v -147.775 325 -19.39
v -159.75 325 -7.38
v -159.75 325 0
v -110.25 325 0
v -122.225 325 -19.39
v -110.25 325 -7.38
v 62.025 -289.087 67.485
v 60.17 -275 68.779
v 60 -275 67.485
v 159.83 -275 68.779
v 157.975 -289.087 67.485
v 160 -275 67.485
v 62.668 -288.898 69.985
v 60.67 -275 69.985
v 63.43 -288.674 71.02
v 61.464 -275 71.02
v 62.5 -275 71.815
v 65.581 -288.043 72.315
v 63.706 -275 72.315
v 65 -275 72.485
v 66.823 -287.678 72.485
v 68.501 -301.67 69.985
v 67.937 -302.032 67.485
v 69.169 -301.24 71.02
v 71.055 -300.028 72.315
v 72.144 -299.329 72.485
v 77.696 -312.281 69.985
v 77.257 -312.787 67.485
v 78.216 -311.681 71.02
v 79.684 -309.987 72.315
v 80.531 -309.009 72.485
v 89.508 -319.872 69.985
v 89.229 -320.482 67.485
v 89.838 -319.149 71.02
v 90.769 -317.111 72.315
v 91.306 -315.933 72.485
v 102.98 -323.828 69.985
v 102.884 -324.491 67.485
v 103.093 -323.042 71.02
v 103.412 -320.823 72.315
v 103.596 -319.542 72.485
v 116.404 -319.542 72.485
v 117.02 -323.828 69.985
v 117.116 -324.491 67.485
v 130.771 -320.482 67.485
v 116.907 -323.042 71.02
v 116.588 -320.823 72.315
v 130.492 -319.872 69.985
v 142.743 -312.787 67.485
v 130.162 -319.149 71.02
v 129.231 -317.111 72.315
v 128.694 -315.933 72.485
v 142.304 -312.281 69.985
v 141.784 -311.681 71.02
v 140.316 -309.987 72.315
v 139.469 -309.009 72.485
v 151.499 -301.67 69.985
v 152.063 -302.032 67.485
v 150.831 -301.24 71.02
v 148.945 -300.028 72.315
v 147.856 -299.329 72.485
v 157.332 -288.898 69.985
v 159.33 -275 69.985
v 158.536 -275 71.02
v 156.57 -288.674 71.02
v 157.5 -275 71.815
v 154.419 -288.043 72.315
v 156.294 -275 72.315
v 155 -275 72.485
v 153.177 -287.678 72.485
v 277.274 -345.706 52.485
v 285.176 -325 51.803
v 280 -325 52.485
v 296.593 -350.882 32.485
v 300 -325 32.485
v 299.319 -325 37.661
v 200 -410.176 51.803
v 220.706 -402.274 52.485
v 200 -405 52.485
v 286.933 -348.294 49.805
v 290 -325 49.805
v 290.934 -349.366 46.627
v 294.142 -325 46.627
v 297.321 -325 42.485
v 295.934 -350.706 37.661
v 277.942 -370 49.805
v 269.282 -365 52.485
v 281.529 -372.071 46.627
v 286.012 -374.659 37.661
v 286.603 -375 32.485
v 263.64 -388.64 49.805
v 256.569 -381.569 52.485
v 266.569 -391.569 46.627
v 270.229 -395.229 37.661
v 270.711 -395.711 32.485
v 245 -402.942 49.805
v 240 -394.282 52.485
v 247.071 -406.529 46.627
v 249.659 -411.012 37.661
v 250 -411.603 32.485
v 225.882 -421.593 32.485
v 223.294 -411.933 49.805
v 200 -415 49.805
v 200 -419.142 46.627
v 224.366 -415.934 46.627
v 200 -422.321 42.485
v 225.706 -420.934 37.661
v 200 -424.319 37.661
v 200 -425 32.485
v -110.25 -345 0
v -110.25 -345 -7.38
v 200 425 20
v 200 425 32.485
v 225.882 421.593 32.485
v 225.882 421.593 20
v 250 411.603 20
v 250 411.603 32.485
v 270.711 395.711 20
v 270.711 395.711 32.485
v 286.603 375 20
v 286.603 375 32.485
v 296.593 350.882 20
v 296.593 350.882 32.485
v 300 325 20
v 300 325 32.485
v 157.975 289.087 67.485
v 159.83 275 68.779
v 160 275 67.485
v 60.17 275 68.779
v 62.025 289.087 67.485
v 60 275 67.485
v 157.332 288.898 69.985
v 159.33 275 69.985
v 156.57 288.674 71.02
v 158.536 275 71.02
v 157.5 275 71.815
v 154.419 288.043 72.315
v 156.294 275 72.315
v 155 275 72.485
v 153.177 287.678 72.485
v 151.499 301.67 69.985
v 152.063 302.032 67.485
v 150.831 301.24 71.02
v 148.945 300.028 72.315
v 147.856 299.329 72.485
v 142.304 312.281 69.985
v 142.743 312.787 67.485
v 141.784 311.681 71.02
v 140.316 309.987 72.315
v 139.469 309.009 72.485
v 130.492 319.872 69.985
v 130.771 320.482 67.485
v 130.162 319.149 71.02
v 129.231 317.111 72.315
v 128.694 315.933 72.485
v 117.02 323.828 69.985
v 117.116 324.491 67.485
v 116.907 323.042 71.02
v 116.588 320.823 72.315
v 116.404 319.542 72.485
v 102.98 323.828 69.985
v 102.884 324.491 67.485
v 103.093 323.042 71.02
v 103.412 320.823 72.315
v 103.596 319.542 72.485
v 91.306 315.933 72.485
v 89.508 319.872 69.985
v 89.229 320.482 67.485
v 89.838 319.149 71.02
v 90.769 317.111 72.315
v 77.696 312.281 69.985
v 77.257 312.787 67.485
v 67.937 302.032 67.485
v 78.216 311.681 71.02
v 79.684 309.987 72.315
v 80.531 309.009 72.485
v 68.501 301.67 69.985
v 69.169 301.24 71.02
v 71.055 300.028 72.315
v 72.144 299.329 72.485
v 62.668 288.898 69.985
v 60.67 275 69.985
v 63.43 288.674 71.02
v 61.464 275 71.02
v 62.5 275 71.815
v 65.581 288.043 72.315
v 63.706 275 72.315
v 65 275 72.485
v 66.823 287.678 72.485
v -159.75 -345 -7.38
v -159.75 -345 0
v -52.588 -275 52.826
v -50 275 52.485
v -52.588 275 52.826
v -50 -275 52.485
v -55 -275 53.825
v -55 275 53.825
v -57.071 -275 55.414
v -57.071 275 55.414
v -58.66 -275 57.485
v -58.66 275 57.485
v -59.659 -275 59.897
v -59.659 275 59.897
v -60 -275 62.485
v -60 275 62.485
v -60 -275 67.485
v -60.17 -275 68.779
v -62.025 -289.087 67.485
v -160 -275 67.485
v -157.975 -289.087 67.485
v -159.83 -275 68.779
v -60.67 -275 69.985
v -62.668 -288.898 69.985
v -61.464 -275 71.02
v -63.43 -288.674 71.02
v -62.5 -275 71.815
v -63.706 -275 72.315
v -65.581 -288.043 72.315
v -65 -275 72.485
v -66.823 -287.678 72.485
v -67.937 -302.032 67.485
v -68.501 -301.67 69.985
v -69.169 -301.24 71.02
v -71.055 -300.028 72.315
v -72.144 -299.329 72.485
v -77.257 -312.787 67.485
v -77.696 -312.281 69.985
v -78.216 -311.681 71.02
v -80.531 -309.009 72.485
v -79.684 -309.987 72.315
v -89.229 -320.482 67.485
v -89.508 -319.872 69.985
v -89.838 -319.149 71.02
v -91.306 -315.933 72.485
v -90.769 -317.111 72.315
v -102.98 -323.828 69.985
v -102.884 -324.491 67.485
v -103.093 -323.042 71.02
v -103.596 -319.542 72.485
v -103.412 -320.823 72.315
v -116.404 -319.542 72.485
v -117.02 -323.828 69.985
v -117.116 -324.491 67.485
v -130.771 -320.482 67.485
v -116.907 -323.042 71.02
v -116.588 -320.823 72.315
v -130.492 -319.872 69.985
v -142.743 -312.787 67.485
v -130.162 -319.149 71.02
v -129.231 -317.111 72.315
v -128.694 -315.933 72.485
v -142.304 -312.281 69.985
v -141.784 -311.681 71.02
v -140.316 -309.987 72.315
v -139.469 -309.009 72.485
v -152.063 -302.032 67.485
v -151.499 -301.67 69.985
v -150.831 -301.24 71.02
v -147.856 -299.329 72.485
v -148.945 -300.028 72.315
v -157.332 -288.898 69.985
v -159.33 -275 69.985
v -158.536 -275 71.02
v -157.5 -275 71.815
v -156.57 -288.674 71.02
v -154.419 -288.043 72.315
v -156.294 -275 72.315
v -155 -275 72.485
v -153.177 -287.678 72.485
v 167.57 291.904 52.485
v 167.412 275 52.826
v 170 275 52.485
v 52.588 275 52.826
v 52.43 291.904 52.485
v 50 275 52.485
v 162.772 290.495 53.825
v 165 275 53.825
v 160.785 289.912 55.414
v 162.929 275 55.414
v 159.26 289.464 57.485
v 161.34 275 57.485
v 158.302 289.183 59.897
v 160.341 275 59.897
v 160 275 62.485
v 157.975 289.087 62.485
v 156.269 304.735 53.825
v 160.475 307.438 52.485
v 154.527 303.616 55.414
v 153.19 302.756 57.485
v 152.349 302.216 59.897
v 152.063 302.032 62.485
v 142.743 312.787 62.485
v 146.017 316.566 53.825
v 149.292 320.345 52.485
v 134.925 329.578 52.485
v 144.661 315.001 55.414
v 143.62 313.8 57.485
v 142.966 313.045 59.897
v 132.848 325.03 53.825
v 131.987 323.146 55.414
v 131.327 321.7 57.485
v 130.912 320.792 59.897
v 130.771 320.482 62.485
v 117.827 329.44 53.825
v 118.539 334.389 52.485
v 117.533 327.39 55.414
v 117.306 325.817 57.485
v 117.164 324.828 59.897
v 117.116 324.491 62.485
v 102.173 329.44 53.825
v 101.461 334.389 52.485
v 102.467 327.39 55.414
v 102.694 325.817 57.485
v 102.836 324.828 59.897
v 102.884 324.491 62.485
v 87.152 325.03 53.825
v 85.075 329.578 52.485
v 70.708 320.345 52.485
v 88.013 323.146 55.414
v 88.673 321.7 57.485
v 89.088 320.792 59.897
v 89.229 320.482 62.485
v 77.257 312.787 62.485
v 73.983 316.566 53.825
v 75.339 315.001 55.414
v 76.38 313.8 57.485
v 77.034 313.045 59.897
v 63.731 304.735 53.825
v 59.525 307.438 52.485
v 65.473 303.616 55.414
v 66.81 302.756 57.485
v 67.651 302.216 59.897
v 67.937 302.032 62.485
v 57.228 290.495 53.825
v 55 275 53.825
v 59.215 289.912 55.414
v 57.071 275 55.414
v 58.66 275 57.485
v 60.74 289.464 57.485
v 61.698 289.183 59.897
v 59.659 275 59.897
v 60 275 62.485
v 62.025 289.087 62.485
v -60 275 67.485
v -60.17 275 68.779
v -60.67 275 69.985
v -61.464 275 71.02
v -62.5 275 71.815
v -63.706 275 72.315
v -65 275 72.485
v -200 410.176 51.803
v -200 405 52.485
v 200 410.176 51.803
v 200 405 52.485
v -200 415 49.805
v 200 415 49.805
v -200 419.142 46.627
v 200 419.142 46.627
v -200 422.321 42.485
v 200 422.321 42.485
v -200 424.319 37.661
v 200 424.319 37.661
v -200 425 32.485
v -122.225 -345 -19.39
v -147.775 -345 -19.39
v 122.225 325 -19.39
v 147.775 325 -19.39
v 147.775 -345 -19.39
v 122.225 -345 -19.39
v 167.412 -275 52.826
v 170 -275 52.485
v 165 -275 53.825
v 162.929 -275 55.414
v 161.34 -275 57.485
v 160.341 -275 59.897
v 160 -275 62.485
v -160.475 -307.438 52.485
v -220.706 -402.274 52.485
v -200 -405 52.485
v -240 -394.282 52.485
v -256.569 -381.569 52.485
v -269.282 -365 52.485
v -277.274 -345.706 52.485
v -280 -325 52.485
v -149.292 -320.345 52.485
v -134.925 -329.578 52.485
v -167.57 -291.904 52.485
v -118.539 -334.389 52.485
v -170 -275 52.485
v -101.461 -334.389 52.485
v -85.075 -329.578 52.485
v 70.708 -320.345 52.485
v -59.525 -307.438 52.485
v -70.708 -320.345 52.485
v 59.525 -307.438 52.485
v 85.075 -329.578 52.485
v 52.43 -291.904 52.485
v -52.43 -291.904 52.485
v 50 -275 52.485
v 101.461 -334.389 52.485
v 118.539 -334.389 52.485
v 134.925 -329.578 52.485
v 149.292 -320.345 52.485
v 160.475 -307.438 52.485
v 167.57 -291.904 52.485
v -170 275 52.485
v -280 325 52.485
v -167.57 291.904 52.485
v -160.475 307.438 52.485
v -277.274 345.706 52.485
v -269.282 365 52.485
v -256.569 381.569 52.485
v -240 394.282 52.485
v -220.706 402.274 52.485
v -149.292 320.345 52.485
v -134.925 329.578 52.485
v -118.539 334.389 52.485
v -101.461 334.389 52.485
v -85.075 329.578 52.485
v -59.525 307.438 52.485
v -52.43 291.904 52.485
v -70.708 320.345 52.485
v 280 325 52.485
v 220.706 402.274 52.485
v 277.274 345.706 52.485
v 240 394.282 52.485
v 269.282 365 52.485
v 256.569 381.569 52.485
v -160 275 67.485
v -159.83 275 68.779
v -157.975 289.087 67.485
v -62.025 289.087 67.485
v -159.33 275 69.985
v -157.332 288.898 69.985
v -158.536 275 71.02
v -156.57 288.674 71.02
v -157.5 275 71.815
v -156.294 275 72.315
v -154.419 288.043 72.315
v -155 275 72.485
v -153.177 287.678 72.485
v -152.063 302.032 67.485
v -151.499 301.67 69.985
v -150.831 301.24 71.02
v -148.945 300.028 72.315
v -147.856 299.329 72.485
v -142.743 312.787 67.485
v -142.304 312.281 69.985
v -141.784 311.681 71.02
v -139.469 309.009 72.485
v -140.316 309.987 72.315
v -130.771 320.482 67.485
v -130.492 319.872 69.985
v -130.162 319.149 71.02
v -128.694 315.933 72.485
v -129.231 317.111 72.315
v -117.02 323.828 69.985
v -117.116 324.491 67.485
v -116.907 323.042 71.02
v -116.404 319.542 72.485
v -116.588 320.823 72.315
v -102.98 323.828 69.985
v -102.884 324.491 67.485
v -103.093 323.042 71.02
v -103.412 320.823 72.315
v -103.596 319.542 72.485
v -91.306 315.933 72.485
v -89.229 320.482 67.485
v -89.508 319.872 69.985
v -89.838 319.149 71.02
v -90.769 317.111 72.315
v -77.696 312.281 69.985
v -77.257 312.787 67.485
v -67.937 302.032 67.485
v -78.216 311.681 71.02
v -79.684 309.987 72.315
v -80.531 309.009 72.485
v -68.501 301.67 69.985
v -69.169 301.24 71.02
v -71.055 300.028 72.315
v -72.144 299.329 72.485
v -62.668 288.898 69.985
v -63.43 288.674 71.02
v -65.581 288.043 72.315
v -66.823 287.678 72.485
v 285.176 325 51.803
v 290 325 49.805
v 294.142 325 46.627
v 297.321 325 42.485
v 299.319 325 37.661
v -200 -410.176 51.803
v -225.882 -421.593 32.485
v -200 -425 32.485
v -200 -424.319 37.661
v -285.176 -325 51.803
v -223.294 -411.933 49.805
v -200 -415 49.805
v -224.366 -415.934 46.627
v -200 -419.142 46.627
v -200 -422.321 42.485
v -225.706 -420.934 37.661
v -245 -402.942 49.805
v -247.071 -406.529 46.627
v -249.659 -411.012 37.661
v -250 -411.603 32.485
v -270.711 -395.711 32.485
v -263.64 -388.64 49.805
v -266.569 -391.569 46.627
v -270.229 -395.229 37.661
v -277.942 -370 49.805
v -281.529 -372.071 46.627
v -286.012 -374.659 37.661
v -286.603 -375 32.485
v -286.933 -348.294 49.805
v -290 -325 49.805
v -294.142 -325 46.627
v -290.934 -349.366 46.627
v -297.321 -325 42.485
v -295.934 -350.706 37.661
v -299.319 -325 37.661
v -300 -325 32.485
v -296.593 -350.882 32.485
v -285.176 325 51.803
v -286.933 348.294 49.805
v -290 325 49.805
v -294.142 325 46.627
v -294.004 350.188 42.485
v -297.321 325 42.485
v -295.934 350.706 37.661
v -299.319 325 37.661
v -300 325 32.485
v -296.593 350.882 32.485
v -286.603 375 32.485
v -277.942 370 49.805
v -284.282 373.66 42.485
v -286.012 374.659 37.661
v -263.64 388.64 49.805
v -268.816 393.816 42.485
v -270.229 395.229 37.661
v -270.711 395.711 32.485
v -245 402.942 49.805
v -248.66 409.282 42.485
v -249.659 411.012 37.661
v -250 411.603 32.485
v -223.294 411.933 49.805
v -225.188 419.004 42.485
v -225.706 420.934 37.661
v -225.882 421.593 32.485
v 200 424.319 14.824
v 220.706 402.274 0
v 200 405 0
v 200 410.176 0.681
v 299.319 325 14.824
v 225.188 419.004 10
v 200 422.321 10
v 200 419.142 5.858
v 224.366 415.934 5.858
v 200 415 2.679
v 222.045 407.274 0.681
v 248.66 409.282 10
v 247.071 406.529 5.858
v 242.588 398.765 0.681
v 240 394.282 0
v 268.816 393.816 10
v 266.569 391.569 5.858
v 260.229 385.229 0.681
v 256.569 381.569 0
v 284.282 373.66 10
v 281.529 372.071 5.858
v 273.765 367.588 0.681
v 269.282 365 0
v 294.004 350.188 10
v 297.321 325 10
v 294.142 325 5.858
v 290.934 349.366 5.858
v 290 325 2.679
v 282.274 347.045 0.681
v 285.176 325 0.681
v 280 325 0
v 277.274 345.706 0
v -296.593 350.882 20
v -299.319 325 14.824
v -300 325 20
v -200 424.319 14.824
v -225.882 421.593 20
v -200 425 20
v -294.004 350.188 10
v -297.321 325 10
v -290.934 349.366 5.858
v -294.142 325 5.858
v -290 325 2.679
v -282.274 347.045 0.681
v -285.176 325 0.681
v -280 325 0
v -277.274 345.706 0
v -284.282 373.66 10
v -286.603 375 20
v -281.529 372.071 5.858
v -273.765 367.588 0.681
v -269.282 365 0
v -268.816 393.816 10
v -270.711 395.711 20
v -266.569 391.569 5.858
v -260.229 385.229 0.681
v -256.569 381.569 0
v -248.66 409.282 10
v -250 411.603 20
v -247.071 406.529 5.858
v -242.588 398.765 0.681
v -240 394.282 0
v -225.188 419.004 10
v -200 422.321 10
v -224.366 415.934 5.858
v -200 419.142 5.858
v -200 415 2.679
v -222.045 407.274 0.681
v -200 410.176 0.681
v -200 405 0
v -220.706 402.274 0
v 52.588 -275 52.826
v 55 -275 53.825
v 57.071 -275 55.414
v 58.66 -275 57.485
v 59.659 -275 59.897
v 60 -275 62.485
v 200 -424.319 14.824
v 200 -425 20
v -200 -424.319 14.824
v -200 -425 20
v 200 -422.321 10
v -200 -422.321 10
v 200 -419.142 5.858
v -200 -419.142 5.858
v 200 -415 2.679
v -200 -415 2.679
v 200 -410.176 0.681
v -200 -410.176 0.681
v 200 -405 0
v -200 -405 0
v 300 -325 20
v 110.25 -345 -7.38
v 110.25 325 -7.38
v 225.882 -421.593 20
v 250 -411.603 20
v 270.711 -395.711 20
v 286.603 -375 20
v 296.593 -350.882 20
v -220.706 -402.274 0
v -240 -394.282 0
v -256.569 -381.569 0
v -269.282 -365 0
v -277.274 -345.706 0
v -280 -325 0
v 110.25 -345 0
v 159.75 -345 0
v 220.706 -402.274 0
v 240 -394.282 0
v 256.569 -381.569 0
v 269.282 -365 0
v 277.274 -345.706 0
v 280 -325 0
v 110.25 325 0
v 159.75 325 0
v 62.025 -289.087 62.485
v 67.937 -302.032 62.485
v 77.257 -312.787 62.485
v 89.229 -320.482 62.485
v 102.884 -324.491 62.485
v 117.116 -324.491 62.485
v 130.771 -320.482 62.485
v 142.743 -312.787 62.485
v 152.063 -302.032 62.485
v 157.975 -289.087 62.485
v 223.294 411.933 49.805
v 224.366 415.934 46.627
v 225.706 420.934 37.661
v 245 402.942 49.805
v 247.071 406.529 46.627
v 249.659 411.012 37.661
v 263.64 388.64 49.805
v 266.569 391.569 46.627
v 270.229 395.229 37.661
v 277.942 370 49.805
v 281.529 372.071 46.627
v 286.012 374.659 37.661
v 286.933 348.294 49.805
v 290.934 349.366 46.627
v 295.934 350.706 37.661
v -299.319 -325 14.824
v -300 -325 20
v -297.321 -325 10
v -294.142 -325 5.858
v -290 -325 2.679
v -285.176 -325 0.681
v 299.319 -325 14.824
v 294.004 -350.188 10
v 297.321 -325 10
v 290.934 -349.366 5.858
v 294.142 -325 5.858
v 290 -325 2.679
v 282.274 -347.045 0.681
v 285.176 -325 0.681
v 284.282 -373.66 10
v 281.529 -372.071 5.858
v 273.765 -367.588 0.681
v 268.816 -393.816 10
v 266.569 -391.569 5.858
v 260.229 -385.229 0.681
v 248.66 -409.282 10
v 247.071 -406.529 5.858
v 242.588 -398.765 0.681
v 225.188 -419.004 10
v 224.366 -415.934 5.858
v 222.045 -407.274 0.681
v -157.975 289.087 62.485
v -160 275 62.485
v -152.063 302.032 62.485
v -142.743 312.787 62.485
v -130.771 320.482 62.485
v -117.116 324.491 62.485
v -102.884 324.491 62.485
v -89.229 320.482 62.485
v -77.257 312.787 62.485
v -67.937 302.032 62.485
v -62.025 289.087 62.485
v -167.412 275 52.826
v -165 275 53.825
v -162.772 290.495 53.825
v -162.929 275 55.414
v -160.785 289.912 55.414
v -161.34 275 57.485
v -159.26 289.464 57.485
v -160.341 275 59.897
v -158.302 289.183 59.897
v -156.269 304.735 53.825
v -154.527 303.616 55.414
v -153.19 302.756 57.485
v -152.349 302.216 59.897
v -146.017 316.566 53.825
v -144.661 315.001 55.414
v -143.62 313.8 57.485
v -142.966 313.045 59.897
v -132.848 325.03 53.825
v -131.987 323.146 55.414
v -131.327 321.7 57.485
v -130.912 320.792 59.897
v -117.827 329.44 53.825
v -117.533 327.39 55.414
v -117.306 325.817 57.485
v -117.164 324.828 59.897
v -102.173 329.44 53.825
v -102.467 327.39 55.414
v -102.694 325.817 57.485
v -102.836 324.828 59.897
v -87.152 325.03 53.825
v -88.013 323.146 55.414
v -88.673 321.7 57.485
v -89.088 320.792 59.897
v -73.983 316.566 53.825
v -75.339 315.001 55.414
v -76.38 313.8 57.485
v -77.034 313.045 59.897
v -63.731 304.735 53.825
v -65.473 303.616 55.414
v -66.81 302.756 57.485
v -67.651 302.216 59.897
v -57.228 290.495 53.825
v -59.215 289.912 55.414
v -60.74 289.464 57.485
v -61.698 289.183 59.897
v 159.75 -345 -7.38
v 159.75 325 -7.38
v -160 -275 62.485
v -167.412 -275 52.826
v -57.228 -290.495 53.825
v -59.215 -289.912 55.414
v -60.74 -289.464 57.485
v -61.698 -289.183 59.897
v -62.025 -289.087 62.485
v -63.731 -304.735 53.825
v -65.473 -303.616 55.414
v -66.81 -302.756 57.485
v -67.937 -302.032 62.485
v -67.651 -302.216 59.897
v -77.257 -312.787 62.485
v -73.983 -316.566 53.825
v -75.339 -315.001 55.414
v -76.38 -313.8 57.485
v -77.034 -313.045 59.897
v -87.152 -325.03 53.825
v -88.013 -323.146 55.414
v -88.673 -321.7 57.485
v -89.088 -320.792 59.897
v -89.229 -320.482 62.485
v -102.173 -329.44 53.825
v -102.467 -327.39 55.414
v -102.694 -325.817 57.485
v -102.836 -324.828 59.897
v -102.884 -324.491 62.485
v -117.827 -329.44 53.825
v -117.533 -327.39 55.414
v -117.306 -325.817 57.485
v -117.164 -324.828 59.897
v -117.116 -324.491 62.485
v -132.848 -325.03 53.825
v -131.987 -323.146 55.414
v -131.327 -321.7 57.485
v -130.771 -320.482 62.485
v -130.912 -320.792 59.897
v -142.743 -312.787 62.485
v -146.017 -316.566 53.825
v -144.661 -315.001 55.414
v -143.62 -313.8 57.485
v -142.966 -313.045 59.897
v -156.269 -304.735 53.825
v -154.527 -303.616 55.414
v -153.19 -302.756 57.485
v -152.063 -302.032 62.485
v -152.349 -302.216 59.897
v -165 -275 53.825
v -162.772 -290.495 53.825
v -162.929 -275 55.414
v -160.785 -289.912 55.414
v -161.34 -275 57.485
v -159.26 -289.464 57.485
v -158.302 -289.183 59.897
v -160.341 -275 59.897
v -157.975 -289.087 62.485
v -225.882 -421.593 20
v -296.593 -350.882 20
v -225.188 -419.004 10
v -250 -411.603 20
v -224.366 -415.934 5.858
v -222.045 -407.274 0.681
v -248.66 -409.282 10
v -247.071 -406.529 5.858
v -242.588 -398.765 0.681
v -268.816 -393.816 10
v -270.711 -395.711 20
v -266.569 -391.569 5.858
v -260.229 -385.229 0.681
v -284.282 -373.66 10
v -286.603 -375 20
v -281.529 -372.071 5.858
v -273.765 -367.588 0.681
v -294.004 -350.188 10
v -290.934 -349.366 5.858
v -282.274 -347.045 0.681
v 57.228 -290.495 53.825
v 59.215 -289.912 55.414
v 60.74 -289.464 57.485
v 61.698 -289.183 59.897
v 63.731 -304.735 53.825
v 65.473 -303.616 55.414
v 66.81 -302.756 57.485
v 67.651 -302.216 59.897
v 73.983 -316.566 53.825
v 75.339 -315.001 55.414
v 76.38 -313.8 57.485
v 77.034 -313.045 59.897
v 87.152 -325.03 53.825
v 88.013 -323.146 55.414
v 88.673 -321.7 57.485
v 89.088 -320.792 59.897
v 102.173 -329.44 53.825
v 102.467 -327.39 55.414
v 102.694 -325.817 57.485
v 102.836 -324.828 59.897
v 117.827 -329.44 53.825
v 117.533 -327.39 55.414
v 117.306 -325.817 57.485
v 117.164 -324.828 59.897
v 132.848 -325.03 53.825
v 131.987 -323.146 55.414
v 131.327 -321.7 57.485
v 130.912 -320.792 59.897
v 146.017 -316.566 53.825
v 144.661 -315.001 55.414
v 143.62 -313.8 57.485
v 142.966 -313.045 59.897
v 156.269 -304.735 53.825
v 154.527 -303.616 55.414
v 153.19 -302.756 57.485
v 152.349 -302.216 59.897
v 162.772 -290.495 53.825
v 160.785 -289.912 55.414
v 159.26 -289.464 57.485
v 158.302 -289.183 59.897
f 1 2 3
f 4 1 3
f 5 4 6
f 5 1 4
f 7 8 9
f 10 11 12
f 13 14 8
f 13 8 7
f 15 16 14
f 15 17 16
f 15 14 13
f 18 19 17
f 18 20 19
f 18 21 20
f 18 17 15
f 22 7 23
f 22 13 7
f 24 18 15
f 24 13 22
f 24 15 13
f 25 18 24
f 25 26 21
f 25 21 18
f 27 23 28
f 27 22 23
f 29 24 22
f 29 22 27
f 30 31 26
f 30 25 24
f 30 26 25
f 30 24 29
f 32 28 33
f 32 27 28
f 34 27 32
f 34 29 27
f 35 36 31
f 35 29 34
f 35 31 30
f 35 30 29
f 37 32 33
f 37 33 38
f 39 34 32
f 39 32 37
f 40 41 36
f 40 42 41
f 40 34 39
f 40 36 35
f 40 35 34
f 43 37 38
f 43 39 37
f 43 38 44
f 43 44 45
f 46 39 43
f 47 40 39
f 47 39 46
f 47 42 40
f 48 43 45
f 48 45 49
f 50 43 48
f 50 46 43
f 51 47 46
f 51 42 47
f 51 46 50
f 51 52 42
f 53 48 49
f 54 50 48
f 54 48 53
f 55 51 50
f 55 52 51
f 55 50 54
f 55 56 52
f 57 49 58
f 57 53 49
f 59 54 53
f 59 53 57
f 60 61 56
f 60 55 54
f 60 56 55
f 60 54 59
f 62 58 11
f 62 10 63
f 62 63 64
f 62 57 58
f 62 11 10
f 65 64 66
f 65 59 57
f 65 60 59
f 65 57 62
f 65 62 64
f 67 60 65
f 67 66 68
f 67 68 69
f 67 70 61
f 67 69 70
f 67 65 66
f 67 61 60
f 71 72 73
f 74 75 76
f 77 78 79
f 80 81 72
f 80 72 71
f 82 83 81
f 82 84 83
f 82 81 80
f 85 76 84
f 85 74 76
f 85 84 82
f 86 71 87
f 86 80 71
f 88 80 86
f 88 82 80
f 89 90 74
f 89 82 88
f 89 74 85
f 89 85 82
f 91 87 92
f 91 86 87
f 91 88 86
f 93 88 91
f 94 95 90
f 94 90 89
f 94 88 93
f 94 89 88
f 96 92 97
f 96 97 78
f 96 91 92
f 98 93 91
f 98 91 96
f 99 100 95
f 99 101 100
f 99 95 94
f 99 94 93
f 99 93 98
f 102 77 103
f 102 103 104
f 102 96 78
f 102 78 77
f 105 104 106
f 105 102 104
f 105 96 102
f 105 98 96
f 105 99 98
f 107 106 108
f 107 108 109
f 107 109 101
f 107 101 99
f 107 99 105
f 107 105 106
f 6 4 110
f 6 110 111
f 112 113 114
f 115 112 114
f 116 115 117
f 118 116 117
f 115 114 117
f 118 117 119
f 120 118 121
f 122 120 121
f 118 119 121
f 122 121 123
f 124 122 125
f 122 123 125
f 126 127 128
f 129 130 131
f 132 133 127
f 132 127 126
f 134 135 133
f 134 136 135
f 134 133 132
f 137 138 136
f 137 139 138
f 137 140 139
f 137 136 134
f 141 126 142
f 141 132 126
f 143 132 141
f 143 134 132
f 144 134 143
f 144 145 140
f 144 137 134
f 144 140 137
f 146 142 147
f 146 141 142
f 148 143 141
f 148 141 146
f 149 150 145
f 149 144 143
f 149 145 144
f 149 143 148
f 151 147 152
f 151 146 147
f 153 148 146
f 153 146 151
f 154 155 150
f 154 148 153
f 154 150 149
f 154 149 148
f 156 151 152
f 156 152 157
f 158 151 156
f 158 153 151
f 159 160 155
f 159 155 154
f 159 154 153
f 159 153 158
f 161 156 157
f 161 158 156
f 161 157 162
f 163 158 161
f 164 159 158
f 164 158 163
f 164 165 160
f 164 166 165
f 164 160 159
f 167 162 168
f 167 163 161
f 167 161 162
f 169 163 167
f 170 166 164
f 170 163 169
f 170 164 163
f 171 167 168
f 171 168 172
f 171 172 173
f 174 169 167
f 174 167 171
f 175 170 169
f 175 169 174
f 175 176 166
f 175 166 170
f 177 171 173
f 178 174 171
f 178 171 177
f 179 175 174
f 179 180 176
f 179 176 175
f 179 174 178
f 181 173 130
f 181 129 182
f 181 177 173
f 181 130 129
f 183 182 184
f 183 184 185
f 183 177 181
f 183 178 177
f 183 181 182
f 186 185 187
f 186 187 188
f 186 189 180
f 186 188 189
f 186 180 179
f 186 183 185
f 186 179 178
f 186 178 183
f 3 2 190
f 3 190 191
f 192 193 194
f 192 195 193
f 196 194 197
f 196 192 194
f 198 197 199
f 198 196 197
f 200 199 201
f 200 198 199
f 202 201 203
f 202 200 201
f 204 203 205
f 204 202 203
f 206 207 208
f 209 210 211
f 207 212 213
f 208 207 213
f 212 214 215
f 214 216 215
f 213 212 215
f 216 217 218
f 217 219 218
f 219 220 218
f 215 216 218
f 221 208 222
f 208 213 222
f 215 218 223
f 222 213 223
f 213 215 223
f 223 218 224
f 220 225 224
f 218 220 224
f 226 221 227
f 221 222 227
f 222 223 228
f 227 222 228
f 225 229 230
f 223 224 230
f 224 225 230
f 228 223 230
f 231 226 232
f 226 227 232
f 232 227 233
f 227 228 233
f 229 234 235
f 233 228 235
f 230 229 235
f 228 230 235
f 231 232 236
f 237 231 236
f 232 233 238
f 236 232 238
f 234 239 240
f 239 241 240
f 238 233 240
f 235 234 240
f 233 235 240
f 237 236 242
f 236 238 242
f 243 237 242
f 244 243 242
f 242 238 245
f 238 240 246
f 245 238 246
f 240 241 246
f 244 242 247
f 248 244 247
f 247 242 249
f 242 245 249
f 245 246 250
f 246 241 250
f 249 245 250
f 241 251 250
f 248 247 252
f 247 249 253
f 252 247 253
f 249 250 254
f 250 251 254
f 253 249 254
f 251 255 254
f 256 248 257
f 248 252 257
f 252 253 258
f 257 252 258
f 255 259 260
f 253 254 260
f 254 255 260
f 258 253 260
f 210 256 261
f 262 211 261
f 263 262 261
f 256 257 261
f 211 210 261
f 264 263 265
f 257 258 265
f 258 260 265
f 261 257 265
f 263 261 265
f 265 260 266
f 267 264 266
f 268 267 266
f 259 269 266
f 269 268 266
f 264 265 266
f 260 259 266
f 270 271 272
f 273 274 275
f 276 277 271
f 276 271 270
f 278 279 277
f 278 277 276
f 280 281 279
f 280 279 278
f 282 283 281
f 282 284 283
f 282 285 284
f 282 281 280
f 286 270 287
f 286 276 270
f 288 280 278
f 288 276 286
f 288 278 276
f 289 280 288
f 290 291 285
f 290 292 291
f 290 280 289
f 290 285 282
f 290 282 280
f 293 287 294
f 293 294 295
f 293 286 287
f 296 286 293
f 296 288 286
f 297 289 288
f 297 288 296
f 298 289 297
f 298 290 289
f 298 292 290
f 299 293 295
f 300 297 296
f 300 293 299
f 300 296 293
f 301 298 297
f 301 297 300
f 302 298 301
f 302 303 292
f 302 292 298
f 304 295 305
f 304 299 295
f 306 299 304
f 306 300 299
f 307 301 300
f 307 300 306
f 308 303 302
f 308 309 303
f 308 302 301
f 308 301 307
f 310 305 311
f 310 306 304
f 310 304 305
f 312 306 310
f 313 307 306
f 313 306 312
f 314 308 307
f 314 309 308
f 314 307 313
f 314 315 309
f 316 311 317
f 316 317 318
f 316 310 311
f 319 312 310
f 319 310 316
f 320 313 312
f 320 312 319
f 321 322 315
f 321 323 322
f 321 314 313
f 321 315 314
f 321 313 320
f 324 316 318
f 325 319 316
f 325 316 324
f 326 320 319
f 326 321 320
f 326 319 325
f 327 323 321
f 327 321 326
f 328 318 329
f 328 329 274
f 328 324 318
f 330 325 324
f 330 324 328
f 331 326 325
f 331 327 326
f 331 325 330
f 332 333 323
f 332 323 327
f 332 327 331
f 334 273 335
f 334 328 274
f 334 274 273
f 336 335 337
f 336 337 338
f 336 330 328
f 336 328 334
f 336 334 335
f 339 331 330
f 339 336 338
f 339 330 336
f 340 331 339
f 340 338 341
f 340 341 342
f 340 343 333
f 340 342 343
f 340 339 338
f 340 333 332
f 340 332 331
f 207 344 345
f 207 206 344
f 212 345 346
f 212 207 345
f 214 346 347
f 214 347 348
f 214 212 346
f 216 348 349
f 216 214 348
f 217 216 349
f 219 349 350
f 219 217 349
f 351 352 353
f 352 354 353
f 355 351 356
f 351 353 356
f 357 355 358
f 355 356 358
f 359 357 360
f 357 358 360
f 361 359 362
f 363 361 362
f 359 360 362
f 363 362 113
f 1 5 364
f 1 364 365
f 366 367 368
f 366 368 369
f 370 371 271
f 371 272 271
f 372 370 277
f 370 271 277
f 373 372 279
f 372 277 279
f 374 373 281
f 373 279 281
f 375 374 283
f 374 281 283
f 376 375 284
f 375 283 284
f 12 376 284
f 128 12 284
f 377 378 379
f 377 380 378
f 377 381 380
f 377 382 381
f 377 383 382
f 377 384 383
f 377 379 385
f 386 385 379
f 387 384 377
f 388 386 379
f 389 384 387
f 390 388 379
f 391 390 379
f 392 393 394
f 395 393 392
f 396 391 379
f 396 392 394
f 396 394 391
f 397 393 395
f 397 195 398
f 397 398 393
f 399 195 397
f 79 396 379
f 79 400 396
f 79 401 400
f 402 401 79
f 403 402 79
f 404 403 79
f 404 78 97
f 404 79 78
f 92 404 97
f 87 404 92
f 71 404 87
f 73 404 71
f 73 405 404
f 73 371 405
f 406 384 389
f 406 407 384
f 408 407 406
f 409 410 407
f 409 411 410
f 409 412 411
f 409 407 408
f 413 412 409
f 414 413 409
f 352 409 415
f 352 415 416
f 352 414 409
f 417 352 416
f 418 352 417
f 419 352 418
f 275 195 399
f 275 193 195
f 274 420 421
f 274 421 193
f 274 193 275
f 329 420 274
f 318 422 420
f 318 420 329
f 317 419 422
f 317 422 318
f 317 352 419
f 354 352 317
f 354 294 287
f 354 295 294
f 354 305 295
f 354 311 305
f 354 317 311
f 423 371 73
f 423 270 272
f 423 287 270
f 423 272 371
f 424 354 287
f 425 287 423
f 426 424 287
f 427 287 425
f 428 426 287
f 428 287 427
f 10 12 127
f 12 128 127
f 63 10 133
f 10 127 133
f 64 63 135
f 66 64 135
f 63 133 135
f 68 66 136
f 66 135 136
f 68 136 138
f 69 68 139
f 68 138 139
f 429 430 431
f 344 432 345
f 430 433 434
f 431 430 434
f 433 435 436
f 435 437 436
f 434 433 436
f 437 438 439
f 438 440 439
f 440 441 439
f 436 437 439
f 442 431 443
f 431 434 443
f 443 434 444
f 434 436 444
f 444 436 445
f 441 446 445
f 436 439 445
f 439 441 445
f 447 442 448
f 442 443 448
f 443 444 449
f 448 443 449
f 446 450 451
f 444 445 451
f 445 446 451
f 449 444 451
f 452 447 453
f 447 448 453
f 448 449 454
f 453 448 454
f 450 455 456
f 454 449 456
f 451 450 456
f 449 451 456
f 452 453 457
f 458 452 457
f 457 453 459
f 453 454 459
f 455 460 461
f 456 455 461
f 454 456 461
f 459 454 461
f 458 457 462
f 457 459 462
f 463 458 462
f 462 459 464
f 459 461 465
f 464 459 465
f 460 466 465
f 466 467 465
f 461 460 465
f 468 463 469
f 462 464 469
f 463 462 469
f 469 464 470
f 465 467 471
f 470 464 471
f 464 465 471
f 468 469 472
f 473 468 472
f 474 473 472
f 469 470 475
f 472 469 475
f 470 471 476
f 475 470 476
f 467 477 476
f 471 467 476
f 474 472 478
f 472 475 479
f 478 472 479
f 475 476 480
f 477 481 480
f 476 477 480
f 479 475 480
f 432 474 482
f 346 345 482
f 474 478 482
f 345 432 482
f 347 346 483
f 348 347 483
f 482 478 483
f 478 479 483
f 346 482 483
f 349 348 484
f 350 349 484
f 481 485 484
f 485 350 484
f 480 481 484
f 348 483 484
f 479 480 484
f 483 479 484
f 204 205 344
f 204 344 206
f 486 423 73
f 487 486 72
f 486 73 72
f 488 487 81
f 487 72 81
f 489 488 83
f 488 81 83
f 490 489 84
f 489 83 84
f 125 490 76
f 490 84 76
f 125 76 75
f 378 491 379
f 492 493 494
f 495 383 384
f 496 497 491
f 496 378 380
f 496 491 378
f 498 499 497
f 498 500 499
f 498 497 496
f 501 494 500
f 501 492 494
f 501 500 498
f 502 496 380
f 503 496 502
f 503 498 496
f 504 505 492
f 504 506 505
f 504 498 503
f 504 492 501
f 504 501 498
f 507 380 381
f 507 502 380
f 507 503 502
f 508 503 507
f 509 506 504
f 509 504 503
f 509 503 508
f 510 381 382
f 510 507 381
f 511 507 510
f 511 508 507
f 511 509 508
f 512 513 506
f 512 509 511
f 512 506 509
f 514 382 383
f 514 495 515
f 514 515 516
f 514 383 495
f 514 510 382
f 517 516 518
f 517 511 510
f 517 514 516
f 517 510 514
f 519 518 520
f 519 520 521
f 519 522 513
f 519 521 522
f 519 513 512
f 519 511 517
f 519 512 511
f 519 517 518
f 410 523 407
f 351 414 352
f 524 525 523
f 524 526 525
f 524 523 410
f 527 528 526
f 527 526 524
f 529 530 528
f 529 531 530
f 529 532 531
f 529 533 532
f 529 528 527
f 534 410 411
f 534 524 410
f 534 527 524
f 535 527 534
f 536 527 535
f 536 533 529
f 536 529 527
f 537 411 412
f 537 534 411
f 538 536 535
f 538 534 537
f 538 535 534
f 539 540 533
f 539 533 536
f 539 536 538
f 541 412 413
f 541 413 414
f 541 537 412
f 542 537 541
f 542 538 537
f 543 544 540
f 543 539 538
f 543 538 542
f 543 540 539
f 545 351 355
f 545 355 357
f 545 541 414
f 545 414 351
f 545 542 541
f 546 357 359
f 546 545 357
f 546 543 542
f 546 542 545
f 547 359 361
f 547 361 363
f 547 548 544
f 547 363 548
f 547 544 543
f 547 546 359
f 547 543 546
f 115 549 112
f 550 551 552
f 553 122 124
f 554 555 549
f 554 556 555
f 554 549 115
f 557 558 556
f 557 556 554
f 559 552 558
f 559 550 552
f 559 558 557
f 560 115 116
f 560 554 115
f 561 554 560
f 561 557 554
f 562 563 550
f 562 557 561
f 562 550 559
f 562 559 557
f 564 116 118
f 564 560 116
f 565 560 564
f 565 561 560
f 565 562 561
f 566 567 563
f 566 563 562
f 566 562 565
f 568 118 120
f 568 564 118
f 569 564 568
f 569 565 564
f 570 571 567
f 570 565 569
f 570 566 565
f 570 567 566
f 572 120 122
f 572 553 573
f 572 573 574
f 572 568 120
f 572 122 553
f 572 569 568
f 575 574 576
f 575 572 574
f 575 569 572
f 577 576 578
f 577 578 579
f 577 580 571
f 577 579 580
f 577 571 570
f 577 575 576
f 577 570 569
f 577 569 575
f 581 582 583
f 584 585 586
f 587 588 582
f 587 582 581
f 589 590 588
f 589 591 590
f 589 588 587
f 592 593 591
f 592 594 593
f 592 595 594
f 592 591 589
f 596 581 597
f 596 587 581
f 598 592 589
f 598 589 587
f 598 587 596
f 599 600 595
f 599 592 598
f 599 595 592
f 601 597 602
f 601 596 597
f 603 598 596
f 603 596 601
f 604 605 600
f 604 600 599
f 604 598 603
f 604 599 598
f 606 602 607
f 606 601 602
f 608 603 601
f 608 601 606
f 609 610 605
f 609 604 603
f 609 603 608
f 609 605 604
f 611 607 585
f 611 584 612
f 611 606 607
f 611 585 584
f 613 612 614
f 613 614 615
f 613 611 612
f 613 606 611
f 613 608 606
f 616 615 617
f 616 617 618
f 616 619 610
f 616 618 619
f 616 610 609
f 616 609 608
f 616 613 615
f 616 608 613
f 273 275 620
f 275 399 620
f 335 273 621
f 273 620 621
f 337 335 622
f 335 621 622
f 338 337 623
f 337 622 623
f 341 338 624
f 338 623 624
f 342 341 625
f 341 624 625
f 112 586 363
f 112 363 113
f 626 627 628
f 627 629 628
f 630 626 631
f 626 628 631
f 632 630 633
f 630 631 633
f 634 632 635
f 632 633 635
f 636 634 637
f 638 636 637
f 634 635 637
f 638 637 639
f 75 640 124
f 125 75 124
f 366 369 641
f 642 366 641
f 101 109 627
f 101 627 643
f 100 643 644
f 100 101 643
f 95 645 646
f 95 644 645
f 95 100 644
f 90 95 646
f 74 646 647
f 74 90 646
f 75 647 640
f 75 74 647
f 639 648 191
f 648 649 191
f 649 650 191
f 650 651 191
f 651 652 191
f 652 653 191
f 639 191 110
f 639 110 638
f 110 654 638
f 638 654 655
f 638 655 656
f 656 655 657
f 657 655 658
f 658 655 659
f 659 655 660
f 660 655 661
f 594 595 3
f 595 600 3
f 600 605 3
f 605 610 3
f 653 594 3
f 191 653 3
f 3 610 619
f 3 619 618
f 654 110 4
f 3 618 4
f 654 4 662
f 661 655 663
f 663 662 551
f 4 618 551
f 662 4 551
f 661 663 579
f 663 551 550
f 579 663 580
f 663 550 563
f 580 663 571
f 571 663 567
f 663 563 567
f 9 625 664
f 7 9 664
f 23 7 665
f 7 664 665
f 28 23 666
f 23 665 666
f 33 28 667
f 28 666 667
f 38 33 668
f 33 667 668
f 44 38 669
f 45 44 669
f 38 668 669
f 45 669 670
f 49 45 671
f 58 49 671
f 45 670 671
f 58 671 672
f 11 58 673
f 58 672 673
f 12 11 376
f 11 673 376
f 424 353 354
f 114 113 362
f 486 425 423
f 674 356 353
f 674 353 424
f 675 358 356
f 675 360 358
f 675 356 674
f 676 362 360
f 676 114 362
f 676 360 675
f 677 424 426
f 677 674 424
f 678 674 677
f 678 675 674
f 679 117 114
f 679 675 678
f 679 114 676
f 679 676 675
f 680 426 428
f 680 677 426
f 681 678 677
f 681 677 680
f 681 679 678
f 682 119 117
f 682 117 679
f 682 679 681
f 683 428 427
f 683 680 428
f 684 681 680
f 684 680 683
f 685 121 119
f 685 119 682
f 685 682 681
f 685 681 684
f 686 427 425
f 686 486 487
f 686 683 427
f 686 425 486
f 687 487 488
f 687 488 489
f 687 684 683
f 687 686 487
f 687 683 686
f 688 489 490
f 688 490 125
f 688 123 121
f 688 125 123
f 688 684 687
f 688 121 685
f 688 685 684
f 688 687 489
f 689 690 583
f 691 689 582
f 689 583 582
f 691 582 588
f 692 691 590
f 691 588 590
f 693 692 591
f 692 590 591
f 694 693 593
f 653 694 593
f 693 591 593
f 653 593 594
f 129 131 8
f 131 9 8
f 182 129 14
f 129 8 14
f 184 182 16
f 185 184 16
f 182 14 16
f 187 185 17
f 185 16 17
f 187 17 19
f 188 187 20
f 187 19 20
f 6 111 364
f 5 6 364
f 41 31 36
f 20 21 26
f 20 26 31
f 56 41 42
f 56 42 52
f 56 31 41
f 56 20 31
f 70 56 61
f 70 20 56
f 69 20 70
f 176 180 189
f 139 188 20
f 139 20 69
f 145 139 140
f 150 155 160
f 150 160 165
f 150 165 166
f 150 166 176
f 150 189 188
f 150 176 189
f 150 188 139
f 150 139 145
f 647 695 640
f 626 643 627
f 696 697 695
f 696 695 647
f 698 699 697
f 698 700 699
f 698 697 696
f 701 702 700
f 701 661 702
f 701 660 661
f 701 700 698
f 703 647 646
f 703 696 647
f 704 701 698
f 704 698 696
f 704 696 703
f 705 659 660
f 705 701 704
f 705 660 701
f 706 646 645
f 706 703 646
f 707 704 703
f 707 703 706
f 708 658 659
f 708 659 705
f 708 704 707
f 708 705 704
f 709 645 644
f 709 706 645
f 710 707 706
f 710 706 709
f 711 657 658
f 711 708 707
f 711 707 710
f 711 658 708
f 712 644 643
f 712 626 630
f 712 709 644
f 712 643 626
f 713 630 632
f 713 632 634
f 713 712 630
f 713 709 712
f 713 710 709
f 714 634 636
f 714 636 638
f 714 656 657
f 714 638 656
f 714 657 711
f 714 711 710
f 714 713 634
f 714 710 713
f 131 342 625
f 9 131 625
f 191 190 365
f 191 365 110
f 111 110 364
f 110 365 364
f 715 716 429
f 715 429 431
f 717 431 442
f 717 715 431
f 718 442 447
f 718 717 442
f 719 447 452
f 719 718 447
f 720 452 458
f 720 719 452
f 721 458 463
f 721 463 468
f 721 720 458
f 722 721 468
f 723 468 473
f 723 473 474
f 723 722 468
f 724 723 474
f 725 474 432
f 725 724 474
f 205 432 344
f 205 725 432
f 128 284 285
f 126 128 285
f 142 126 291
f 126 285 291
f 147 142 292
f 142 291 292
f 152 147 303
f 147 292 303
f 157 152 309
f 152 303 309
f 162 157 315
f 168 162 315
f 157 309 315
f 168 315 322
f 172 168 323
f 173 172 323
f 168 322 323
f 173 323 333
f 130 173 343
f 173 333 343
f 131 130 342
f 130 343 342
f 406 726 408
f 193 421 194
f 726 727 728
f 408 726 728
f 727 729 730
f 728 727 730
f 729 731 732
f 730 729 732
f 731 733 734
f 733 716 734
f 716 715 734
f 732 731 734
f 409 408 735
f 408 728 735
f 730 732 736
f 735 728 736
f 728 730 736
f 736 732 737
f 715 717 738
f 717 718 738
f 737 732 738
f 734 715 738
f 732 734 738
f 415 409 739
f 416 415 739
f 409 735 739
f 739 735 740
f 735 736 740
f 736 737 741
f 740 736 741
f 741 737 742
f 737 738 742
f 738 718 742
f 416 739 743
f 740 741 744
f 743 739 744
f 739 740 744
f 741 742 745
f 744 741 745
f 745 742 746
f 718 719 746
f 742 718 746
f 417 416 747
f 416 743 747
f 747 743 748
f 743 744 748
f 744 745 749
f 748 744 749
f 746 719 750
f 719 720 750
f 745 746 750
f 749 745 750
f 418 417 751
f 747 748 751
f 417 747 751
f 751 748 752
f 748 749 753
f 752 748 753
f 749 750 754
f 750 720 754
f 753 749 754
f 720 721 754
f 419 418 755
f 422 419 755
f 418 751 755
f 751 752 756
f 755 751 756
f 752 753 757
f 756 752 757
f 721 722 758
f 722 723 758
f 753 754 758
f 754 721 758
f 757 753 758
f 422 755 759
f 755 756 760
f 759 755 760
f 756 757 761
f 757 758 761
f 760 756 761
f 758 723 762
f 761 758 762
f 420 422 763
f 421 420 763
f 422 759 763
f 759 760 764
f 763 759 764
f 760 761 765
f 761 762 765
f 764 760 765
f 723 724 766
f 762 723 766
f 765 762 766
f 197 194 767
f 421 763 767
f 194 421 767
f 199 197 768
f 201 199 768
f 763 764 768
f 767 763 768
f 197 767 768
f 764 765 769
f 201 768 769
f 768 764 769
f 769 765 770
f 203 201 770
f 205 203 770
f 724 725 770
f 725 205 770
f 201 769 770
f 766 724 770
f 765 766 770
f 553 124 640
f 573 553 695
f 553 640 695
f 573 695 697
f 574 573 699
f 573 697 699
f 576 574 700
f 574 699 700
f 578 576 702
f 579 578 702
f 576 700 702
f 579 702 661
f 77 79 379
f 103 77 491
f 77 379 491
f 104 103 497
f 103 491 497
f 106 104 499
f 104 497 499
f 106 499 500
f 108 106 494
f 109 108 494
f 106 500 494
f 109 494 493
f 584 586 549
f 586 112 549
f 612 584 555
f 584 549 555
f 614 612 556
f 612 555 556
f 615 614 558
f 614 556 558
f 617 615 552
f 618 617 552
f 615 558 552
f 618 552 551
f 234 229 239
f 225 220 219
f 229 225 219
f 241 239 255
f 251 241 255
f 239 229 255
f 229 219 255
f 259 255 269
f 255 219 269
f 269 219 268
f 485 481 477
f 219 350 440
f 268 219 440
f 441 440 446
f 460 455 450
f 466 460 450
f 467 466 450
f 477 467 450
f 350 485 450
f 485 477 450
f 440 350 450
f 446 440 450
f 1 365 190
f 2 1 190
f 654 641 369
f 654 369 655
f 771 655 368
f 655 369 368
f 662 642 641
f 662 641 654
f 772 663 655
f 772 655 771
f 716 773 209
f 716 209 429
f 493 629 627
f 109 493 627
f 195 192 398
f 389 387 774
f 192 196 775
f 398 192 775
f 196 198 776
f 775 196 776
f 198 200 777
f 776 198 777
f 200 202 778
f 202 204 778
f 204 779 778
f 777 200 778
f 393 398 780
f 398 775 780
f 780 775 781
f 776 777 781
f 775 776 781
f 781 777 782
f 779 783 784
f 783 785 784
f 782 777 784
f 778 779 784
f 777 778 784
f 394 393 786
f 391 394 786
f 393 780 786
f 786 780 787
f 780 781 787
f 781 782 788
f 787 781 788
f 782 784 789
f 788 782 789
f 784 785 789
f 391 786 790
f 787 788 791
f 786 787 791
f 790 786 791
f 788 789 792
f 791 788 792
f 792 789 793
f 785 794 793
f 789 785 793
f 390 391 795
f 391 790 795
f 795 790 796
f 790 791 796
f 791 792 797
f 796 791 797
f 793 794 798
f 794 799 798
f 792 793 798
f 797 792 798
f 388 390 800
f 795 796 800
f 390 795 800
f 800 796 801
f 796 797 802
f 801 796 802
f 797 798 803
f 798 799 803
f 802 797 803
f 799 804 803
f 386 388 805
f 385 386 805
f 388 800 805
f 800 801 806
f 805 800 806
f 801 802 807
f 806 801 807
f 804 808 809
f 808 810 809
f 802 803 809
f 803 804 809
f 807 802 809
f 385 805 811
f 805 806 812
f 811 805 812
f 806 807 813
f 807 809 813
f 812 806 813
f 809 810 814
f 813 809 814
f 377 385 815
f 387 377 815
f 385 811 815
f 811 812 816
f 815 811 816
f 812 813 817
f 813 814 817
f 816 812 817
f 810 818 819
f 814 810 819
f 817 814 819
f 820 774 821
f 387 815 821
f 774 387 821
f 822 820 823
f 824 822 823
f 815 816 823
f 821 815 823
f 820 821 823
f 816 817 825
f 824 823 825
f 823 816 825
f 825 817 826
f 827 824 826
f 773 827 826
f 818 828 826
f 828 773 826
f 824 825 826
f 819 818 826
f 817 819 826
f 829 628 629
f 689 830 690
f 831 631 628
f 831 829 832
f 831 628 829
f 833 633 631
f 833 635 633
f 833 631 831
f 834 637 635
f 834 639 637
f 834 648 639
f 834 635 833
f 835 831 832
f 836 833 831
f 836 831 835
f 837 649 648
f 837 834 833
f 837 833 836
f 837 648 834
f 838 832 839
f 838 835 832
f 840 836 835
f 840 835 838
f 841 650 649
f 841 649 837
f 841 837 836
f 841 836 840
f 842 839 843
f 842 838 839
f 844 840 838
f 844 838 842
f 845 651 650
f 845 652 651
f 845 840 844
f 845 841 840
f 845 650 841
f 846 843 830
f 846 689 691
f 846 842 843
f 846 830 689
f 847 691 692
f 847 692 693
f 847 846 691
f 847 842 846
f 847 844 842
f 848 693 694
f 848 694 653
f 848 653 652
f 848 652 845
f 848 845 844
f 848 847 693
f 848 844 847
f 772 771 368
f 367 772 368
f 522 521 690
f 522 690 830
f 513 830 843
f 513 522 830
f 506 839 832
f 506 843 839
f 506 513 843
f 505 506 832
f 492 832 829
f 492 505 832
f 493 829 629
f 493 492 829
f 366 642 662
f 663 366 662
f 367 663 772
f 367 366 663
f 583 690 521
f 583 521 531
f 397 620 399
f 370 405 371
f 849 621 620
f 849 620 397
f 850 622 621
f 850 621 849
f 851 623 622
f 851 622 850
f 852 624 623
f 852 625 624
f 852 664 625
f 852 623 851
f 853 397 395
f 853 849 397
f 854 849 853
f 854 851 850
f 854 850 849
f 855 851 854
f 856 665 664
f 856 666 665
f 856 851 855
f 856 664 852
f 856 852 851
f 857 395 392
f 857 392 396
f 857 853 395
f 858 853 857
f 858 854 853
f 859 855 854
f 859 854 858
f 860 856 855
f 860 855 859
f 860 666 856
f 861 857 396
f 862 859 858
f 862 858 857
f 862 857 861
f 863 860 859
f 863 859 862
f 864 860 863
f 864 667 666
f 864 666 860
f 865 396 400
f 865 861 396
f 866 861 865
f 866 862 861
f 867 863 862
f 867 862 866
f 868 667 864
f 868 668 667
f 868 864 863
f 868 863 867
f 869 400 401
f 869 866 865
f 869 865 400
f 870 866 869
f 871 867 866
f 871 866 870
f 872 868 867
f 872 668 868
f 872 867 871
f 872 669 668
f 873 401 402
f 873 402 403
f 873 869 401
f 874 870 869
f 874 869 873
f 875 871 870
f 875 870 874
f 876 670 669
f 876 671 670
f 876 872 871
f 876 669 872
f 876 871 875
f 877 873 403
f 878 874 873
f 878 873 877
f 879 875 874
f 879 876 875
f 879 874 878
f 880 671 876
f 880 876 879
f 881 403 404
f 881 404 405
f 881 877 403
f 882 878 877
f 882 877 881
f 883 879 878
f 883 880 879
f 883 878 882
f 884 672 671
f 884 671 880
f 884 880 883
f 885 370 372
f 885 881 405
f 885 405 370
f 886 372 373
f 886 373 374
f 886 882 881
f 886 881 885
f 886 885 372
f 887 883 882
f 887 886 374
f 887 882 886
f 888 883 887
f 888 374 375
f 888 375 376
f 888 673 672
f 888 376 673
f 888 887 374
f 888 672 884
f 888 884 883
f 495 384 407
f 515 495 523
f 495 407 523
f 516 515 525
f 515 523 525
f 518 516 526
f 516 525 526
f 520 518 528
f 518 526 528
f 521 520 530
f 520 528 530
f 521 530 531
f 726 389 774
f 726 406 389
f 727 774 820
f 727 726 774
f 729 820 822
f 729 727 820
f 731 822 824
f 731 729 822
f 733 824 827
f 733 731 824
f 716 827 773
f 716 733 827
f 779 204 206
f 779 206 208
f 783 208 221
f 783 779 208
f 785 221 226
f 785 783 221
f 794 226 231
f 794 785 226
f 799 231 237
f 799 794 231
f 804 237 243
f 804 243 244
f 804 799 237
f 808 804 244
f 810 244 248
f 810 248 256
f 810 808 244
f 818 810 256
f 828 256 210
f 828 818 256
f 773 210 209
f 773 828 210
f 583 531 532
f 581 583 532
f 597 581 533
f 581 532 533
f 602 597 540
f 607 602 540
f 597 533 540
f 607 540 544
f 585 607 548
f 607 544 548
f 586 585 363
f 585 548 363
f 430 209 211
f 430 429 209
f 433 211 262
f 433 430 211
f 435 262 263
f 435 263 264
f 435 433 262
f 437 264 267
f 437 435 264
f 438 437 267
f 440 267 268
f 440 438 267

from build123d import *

# Parameters (mm, degrees)
SKETCH_1_W      = 600
SKETCH_1_H      = 850
EXTRUDE_1_DEPTH = 52.484908593
EXTRUDE_2_DEPTH = 20
FILLET_1_R      = 100
FILLET_2_R      = 10
FILLET_3_R      = 5
FILLET_4_R      = 20
EXTRUDE_START   = -100
EXTRUDE_3_DEPTH = 670


with BuildPart() as part:
    # 草图1 → 凸台-拉伸1 (new body)
    with BuildSketch(Plane.XY):
        Rectangle(SKETCH_1_W, SKETCH_1_H)
    extrude(amount=EXTRUDE_1_DEPTH)

    # 草图2 → 凸台-拉伸2 (add)
    with BuildSketch(Plane.XY.offset(52.484908593)):
        with BuildLine():
            Line((-60, 275), (-60, -275))
            ThreePointArc((-60, -275), (-110, -325), (-160, -275))
            Line((-160, -275), (-160, 275))
            ThreePointArc((-160, 275), (-110, 325), (-60, 275))
        make_face()
        with BuildLine():
            Line((60, 275), (60, -275))
            ThreePointArc((60, -275), (110, -325), (160, -275))
            Line((160, -275), (160, 275))
            ThreePointArc((160, 275), (110, 325), (60, 275))
        make_face()
    extrude(amount=EXTRUDE_2_DEPTH)

    # 圆角1
    fillet_1_edges = [part.edges().sort_by_distance(p)[0] for p in [
        (300, -425, 26.242454296),
        (-300, -425, 26.242454296),
        (-300, 425, 26.242454296),
        (300, 425, 26.242454296),
    ]]
    fillet(fillet_1_edges, radius=FILLET_1_R)

    # 圆角2
    fillet_2_edges = [part.edges().sort_by_distance(p)[0] for p in [
        (-110, 325, 52.484908593),
        (-160, 0, 52.484908593),
        (-110, -325, 52.484908593),
        (-60, 0, 52.484908593),
        (110, 325, 52.484908593),
        (60, 0, 52.484908593),
        (110, -325, 52.484908593),
        (160, 0, 52.484908593),
    ]]
    fillet(fillet_2_edges, radius=FILLET_2_R)

    # 圆角3
    fillet_3_edges = [part.edges().sort_by_distance(p)[0] for p in [
        (-110, 325, 72.484908593),
        (-160, 0, 72.484908593),
        (-110, -325, 72.484908593),
        (-60, 0, 72.484908593),
        (110, 325, 72.484908593),
        (60, 0, 72.484908593),
        (110, -325, 72.484908593),
        (160, 0, 72.484908593),
    ]]
    fillet(fillet_3_edges, radius=FILLET_3_R)

    # 圆角4
    fillet_4_edges = [part.edges().sort_by_distance(p)[0] for p in [
        (0, 425, 0),
        (0, 425, 52.484908593),
        (300, 0, 0),
        (0, -425, 0),
        (-300, 0, 0),
        (-270.710678119, -395.710678119, 0),
        (270.710678119, -395.710678119, 0),
        (-270.710678119, 395.710678119, 0),
        (270.710678119, 395.710678119, 0),
        (300, 0, 52.484908593),
        (-300, 0, 52.484908593),
        (0, -425, 52.484908593),
        (-270.710678119, -395.710678119, 52.484908593),
        (270.710678119, -395.710678119, 52.484908593),
        (-270.710678119, 395.710678119, 52.484908593),
        (270.710678119, 395.710678119, 52.484908593),
    ]]
    fillet(fillet_4_edges, radius=FILLET_4_R)

    # 草图3 → 凸台-拉伸3 (add)
    with BuildSketch(Plane(origin=(0, 425, 0), x_dir=(1, 0, 0), z_dir=(0, 1, 0)).offset(EXTRUDE_START)):
        Polygon((-159.75, 0), (-110.25, 0), (-110.25, 7.38), (-122.225, 19.39), (-147.775, 19.39), (-159.75, 7.38), align=None)
        Polygon((159.75, 0), (159.75, 7.38), (147.775, 19.39), (122.225, 19.39), (110.25, 7.38), (110.25, 0), align=None)
    extrude(amount=-EXTRUDE_3_DEPTH)


solid = part.part
